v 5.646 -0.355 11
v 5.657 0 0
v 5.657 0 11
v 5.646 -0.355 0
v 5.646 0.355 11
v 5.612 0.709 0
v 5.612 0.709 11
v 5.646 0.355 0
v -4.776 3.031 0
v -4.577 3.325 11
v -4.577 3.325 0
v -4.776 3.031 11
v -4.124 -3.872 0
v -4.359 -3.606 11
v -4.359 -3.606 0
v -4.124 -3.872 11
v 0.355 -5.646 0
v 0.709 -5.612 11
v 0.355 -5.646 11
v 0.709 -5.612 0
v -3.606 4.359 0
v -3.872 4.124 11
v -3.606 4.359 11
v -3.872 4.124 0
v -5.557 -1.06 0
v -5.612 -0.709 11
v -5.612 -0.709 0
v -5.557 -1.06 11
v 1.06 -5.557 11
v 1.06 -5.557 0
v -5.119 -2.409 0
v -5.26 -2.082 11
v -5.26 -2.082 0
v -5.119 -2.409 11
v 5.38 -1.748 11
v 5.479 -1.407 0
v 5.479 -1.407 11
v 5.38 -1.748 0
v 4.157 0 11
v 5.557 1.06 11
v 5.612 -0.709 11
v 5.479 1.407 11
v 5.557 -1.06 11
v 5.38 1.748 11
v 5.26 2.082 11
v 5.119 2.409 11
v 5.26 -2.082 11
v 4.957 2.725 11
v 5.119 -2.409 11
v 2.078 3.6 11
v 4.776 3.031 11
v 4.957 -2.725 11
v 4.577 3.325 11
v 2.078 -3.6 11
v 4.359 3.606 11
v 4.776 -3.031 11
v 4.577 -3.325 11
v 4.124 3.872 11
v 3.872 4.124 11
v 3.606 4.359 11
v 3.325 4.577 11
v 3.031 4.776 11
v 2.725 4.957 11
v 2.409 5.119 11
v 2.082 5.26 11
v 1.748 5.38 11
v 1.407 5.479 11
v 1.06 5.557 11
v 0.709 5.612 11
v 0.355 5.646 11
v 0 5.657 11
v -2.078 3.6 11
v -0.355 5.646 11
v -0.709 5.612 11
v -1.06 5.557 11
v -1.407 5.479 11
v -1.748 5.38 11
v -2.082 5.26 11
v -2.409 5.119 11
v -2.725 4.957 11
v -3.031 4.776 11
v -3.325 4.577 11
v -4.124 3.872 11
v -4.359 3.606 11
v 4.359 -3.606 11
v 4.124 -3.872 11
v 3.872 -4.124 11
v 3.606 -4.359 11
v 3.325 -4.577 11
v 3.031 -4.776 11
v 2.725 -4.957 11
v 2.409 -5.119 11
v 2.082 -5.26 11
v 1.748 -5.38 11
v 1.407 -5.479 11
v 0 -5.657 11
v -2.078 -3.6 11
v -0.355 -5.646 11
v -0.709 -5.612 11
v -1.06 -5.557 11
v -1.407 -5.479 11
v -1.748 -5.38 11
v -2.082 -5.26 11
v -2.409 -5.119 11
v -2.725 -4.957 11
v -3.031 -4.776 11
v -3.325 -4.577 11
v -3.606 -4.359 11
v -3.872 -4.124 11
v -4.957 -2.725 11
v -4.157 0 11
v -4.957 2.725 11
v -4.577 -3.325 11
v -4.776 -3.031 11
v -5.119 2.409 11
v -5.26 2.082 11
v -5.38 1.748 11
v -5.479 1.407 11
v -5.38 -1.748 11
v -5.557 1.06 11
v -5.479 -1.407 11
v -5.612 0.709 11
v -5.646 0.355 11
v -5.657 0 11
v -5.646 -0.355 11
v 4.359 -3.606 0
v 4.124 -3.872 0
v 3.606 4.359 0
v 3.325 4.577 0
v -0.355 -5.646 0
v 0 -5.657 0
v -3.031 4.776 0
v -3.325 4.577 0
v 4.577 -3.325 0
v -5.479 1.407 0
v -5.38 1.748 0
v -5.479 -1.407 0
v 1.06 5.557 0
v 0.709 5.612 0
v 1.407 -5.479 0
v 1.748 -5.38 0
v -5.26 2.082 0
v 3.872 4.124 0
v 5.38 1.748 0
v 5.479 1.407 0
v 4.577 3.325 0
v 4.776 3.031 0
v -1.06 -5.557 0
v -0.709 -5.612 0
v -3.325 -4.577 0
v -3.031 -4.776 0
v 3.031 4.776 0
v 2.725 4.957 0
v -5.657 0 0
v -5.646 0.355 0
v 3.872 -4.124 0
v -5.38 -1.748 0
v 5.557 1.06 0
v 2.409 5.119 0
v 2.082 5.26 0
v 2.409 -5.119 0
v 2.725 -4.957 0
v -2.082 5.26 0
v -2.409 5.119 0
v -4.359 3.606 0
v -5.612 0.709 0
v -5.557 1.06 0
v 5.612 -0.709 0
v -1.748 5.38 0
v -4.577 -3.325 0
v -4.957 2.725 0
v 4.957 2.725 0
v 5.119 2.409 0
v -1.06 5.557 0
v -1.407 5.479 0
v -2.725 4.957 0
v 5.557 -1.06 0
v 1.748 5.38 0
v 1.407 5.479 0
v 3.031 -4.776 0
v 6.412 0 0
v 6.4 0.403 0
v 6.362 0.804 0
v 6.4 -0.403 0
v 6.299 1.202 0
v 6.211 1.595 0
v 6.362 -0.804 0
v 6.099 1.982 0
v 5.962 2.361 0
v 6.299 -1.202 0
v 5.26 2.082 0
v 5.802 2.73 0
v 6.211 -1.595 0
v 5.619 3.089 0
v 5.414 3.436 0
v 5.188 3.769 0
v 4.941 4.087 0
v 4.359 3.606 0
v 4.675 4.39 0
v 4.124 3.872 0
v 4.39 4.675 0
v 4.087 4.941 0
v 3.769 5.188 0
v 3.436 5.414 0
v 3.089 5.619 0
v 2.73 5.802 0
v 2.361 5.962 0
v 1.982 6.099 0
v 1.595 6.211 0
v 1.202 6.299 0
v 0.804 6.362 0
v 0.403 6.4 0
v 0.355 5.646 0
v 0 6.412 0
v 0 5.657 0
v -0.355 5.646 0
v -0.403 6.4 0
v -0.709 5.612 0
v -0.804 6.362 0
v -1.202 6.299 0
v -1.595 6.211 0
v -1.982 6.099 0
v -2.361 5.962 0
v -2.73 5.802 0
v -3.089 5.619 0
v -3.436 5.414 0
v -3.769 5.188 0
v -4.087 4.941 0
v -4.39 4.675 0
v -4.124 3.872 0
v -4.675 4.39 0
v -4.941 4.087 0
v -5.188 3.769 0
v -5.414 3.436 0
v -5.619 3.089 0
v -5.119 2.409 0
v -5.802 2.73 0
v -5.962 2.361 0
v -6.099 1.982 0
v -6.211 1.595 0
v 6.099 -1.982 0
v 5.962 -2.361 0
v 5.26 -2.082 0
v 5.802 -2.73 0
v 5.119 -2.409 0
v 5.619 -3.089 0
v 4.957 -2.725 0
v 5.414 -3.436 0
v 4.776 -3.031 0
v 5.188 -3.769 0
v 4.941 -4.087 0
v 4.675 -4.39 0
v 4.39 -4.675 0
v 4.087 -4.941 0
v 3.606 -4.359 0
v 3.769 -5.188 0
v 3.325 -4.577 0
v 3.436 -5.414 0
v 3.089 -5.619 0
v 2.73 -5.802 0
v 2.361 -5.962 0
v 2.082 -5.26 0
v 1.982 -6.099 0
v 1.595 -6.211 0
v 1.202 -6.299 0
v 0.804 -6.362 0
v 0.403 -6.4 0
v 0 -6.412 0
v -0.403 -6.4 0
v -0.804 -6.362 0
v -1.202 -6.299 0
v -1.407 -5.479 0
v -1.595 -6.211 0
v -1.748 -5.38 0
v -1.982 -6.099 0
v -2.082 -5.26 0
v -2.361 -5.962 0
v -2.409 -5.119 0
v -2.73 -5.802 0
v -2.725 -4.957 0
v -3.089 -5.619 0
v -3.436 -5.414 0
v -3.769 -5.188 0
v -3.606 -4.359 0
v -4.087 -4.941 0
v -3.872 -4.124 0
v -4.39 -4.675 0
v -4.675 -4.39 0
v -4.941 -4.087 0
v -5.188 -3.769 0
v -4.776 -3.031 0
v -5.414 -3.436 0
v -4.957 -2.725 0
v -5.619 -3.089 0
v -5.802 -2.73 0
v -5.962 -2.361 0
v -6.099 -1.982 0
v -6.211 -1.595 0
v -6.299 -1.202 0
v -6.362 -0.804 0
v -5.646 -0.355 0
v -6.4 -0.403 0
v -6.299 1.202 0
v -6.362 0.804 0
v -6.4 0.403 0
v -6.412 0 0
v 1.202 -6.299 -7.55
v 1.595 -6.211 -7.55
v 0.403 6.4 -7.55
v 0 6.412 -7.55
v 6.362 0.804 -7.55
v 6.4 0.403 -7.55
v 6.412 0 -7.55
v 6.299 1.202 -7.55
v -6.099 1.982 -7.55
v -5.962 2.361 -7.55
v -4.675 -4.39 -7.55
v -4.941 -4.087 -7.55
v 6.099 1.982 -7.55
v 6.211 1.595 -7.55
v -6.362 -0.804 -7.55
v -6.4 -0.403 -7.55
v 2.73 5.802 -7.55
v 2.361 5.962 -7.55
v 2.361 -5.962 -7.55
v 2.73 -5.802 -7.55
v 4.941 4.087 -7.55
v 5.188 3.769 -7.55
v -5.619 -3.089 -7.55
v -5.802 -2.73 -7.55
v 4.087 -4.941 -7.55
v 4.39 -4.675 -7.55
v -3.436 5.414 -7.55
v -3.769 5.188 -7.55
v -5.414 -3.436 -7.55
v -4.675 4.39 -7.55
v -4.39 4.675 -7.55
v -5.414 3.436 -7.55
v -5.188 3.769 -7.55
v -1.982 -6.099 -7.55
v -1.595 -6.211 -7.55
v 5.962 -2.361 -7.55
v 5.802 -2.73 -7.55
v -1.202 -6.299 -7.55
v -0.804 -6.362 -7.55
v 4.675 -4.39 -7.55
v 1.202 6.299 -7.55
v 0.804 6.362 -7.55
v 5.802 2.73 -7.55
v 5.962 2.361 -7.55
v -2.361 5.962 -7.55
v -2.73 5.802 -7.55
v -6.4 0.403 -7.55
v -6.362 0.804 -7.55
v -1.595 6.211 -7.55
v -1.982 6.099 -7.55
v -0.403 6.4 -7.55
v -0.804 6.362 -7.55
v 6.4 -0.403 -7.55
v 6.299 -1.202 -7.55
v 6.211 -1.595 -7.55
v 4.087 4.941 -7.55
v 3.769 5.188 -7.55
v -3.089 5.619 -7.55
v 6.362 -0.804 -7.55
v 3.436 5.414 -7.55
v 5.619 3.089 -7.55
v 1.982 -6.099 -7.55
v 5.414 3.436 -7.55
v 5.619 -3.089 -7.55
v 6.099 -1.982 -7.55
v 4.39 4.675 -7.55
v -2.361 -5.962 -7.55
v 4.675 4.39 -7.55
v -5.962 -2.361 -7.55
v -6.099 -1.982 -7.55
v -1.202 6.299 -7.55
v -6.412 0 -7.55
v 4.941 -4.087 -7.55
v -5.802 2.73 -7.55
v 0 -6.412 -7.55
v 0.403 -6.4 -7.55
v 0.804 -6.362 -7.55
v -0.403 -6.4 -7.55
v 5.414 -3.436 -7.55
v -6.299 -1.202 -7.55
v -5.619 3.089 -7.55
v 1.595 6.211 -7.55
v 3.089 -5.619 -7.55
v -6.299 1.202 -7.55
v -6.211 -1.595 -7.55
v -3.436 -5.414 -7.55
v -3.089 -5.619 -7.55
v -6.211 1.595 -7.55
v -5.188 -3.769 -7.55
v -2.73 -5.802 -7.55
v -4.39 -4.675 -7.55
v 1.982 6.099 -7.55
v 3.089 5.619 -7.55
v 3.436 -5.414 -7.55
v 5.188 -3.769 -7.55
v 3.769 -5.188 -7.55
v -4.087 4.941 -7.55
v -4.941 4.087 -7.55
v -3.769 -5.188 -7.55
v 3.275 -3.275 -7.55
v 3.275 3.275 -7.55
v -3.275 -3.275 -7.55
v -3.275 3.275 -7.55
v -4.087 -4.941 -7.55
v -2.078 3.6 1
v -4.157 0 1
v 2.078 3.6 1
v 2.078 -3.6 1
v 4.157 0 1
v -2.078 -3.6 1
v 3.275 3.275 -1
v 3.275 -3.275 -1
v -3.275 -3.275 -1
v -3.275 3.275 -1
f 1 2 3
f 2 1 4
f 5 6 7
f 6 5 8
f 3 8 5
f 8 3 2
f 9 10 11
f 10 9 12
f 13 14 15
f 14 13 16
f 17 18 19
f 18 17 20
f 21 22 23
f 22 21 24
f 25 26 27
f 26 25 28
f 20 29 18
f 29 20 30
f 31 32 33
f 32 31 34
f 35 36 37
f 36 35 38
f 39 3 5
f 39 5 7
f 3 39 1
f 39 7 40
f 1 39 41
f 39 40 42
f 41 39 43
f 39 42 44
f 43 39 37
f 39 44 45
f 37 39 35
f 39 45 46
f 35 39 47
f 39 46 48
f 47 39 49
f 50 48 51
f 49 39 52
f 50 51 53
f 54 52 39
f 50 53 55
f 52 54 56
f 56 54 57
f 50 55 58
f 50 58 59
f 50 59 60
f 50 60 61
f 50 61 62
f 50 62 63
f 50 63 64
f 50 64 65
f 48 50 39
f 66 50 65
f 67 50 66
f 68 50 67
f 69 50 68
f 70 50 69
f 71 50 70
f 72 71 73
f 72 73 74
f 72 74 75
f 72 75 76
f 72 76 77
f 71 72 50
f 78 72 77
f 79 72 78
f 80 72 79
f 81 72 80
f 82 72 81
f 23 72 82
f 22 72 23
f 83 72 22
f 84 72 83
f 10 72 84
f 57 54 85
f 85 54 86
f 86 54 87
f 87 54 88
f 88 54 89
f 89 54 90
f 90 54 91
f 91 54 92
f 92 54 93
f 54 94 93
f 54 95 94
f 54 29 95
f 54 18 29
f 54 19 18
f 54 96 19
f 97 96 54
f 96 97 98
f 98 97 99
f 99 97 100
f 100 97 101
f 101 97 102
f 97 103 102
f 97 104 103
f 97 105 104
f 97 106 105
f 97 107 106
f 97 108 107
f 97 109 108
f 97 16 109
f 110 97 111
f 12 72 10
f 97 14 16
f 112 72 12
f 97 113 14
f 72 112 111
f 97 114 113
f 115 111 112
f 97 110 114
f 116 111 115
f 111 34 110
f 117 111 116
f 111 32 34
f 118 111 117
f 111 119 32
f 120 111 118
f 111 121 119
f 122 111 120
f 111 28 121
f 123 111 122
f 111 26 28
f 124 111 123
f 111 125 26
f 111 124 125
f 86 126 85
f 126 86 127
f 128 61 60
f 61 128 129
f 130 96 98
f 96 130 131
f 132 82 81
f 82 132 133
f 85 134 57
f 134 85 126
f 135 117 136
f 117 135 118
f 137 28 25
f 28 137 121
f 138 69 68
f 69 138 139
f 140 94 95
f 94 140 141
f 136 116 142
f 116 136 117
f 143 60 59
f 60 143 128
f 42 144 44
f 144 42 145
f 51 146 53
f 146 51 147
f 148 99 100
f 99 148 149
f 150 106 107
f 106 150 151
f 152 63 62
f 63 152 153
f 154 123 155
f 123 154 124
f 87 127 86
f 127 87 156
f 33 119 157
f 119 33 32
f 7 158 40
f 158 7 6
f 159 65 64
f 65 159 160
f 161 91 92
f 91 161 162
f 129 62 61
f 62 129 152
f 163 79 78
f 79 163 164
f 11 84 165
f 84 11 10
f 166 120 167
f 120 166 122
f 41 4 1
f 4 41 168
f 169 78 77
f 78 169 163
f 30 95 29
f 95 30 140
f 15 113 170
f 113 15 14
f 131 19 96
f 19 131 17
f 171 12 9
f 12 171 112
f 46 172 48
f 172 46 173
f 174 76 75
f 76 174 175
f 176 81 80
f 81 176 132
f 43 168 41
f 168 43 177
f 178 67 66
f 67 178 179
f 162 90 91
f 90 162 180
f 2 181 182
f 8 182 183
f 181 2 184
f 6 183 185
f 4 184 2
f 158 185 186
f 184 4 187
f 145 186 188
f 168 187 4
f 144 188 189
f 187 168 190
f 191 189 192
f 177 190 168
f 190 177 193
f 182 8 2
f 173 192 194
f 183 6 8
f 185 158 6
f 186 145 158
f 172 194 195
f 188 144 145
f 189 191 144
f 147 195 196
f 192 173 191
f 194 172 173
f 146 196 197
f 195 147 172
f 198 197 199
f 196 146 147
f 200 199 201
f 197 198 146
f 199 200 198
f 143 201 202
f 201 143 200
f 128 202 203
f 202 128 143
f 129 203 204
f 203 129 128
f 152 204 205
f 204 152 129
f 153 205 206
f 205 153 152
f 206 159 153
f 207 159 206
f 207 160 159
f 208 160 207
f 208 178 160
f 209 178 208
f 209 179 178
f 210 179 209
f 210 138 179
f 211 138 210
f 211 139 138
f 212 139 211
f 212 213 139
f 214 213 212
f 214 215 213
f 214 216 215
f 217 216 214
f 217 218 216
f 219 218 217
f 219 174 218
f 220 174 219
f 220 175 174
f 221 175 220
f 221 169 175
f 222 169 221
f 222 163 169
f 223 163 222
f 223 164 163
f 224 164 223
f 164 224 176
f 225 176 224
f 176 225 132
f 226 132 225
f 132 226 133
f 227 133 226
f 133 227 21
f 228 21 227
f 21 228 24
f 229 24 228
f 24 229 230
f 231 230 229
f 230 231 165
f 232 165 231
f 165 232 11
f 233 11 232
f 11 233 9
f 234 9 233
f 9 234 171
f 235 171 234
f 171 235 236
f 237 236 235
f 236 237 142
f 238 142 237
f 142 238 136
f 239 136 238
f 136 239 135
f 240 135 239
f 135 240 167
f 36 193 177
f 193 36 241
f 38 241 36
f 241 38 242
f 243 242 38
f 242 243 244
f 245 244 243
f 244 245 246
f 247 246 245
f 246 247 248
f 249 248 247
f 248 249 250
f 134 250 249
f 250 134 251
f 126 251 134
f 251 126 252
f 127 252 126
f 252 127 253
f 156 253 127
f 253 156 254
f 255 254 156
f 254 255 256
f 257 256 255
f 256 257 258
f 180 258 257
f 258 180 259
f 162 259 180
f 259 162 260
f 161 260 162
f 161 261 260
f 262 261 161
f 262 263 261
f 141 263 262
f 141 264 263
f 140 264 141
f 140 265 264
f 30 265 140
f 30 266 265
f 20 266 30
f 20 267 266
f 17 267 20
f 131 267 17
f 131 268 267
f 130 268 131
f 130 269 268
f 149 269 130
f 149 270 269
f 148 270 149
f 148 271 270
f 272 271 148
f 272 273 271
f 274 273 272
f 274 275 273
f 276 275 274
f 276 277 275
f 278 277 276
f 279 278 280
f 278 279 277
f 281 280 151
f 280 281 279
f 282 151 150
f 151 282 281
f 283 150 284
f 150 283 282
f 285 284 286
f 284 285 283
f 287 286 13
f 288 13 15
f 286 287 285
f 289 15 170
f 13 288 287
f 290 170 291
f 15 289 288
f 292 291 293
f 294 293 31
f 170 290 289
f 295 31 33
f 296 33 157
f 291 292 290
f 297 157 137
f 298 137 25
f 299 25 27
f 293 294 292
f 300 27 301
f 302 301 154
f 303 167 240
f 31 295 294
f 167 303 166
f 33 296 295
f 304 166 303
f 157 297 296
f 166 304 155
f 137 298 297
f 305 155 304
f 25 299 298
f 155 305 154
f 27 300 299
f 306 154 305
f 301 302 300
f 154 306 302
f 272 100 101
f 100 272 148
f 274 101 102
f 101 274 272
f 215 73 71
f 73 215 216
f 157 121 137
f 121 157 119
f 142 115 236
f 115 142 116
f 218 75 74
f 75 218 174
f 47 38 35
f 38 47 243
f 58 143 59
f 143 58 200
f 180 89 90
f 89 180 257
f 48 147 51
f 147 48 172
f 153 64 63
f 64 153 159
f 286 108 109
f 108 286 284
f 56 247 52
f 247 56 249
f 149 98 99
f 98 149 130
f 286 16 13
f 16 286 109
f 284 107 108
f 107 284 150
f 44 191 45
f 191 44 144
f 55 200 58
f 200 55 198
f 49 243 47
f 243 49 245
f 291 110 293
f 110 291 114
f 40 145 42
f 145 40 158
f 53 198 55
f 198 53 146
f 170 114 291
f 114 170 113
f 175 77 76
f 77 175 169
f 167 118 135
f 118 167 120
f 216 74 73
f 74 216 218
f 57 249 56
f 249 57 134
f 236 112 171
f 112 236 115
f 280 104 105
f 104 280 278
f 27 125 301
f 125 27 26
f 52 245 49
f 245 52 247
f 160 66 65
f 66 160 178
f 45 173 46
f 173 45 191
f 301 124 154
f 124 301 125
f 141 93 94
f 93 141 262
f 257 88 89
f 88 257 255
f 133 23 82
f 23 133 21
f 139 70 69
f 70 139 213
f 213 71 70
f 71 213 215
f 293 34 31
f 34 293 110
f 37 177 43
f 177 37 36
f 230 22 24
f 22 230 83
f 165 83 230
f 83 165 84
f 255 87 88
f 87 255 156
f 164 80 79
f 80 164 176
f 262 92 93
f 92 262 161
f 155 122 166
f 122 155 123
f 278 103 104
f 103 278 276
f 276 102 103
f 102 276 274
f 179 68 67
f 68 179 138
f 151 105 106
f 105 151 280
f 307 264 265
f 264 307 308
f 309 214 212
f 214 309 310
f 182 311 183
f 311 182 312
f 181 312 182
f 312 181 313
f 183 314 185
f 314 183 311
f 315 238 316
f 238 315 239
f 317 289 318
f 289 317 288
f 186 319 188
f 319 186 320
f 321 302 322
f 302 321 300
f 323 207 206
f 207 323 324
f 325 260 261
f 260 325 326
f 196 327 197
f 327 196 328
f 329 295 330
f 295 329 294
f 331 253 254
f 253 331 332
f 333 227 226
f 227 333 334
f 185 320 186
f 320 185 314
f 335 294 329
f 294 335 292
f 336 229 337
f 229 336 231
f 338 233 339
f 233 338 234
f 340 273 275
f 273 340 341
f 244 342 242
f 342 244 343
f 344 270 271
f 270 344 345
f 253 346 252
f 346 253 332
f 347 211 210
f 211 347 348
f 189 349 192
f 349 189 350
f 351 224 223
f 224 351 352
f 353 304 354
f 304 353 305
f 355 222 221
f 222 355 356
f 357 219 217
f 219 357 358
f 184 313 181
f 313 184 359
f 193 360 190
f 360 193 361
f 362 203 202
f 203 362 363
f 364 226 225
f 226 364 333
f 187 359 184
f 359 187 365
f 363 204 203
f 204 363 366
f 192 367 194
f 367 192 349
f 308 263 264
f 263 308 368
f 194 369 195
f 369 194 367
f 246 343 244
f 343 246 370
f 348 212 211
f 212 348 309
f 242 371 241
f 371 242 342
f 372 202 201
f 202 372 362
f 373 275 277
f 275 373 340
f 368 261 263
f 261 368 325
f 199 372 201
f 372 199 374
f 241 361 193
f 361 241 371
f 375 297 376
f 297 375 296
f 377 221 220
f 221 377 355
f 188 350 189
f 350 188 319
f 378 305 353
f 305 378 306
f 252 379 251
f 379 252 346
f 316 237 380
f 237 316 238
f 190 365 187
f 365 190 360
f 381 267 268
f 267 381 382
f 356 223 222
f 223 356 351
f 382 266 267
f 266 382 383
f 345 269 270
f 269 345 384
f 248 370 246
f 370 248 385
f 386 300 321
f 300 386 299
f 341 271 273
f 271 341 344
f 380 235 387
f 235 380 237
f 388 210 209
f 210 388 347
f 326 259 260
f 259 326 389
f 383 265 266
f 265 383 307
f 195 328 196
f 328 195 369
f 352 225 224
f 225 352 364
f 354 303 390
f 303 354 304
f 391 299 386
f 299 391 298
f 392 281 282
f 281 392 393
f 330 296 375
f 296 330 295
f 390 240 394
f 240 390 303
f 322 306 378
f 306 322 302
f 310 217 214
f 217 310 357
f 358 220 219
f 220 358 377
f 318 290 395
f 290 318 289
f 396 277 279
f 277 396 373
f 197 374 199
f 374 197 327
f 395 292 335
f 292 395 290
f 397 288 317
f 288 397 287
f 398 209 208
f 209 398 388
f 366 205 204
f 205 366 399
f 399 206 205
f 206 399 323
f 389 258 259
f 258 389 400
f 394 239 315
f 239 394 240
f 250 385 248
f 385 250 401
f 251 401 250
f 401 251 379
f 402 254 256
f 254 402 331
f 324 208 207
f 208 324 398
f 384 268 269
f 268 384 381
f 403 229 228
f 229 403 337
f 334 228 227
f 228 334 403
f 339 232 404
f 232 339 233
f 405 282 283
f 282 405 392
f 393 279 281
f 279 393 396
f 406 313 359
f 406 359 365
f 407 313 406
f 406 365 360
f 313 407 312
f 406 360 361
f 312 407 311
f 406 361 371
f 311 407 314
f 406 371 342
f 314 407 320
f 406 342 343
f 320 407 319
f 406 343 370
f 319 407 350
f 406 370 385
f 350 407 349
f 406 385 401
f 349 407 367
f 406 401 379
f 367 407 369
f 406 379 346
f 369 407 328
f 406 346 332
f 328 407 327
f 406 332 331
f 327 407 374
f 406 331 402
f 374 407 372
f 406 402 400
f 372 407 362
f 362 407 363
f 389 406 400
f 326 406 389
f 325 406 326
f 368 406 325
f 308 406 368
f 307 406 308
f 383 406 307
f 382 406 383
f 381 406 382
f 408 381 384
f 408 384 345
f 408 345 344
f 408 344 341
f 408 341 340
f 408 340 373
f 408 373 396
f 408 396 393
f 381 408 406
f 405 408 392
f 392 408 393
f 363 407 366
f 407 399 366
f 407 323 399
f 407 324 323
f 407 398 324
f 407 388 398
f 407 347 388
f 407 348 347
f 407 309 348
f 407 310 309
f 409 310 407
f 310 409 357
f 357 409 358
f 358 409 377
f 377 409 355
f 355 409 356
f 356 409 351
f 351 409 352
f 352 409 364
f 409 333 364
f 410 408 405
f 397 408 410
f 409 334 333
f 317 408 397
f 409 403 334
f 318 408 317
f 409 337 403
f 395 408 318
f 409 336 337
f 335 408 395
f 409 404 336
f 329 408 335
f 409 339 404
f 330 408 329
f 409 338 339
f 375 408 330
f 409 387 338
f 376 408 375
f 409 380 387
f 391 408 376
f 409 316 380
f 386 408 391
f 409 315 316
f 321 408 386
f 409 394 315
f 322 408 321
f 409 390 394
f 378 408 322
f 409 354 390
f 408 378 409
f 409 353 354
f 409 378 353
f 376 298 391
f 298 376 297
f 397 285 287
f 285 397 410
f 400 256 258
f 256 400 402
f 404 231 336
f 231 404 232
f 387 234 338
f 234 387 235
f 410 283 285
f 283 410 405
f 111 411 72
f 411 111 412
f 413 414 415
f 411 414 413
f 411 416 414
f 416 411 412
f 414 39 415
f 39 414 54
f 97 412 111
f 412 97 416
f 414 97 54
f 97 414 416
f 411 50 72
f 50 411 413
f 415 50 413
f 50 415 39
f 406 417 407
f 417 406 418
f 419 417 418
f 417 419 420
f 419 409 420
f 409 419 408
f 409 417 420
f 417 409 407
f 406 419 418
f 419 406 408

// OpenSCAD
// Customizable sockets v2 Improved
// http://www.thingiverse.com/thing:1240520
// Hacked up and improved by
// by infinigrove Squirrel Master 2016 (http://www.thingiverse.com/infinigrove)
//
//
// Remix of Parametric hex socket
// http://www.thingiverse.com/thing:91496
// Originally
// by Dale Price http://www.thingiverse.com/daprice
//

// diameter of hole across-flats
socket_size = 7;
// type of socket
socket_type = 6; // [6:hex-6, 4:square-8, 12:12 point]
// wall thickness of socket
socket_wall_thickness = 3; // [1:0.5:16]
// depth of socket
depth = 10; // [5:80]
// size of drive
drive_size = 6.35; // [6.35:1/4", 9.525:3/8", 12.7:1/2", 19.05:3/4", 25.4:1"]
// wall thickness of drive
drive_wall_thickness = 3; // [1:0.5:16]
// drive and socket size tolerance
tolerance = 0.2;
// socket detail
socket_detail = 100; // [30:180]

/* [Hidden] */

tolSize = socket_size + tolerance;
inscribedSize = tolSize/0.866025;
tolDrive = drive_size + tolerance;

socketRadius = (inscribedSize+socket_wall_thickness)/2;
driveRadius = ((tolDrive*1.5)+drive_wall_thickness)/2;

difference()
{
	union()
	{
		//socket portion
		translate([0,0,(depth+1)/2])
		cylinder(h = depth + 1, r = socketRadius, center = true, $fn = socket_detail);

		//drive portion
		translate([0,0,0-((tolDrive + 1) / 2)])
		cylinder(h = tolDrive + 1, r = driveRadius, center = true, $fn = socket_detail);
	}
	
	//socket hole
    if (socket_type == 12){
        //12 point socket
        translate([0,0,1]) linear_extrude(height = depth, center = false) circle(r = inscribedSize/2, $fn = 6);
        rotate([0,0,30])translate([0,0,1]) linear_extrude(height = depth, center = false) circle(r = inscribedSize/2, $fn = 6);
        
    } else {
        // 6 or 8 point
	translate([0,0,1])
	linear_extrude(height = depth, center = false)
	circle(r = inscribedSize/2, $fn = socket_type);
       // second part for 8 point
    if (socket_type == 4)rotate([0,0,45])translate([0,0,1])
	linear_extrude(height = depth, center = false)
	circle(r = inscribedSize/2, $fn = socket_type);
    }

	//drive hole
	translate([0,0,0-(tolDrive/2)-1])
	cube(size = tolDrive, center = true);
}
